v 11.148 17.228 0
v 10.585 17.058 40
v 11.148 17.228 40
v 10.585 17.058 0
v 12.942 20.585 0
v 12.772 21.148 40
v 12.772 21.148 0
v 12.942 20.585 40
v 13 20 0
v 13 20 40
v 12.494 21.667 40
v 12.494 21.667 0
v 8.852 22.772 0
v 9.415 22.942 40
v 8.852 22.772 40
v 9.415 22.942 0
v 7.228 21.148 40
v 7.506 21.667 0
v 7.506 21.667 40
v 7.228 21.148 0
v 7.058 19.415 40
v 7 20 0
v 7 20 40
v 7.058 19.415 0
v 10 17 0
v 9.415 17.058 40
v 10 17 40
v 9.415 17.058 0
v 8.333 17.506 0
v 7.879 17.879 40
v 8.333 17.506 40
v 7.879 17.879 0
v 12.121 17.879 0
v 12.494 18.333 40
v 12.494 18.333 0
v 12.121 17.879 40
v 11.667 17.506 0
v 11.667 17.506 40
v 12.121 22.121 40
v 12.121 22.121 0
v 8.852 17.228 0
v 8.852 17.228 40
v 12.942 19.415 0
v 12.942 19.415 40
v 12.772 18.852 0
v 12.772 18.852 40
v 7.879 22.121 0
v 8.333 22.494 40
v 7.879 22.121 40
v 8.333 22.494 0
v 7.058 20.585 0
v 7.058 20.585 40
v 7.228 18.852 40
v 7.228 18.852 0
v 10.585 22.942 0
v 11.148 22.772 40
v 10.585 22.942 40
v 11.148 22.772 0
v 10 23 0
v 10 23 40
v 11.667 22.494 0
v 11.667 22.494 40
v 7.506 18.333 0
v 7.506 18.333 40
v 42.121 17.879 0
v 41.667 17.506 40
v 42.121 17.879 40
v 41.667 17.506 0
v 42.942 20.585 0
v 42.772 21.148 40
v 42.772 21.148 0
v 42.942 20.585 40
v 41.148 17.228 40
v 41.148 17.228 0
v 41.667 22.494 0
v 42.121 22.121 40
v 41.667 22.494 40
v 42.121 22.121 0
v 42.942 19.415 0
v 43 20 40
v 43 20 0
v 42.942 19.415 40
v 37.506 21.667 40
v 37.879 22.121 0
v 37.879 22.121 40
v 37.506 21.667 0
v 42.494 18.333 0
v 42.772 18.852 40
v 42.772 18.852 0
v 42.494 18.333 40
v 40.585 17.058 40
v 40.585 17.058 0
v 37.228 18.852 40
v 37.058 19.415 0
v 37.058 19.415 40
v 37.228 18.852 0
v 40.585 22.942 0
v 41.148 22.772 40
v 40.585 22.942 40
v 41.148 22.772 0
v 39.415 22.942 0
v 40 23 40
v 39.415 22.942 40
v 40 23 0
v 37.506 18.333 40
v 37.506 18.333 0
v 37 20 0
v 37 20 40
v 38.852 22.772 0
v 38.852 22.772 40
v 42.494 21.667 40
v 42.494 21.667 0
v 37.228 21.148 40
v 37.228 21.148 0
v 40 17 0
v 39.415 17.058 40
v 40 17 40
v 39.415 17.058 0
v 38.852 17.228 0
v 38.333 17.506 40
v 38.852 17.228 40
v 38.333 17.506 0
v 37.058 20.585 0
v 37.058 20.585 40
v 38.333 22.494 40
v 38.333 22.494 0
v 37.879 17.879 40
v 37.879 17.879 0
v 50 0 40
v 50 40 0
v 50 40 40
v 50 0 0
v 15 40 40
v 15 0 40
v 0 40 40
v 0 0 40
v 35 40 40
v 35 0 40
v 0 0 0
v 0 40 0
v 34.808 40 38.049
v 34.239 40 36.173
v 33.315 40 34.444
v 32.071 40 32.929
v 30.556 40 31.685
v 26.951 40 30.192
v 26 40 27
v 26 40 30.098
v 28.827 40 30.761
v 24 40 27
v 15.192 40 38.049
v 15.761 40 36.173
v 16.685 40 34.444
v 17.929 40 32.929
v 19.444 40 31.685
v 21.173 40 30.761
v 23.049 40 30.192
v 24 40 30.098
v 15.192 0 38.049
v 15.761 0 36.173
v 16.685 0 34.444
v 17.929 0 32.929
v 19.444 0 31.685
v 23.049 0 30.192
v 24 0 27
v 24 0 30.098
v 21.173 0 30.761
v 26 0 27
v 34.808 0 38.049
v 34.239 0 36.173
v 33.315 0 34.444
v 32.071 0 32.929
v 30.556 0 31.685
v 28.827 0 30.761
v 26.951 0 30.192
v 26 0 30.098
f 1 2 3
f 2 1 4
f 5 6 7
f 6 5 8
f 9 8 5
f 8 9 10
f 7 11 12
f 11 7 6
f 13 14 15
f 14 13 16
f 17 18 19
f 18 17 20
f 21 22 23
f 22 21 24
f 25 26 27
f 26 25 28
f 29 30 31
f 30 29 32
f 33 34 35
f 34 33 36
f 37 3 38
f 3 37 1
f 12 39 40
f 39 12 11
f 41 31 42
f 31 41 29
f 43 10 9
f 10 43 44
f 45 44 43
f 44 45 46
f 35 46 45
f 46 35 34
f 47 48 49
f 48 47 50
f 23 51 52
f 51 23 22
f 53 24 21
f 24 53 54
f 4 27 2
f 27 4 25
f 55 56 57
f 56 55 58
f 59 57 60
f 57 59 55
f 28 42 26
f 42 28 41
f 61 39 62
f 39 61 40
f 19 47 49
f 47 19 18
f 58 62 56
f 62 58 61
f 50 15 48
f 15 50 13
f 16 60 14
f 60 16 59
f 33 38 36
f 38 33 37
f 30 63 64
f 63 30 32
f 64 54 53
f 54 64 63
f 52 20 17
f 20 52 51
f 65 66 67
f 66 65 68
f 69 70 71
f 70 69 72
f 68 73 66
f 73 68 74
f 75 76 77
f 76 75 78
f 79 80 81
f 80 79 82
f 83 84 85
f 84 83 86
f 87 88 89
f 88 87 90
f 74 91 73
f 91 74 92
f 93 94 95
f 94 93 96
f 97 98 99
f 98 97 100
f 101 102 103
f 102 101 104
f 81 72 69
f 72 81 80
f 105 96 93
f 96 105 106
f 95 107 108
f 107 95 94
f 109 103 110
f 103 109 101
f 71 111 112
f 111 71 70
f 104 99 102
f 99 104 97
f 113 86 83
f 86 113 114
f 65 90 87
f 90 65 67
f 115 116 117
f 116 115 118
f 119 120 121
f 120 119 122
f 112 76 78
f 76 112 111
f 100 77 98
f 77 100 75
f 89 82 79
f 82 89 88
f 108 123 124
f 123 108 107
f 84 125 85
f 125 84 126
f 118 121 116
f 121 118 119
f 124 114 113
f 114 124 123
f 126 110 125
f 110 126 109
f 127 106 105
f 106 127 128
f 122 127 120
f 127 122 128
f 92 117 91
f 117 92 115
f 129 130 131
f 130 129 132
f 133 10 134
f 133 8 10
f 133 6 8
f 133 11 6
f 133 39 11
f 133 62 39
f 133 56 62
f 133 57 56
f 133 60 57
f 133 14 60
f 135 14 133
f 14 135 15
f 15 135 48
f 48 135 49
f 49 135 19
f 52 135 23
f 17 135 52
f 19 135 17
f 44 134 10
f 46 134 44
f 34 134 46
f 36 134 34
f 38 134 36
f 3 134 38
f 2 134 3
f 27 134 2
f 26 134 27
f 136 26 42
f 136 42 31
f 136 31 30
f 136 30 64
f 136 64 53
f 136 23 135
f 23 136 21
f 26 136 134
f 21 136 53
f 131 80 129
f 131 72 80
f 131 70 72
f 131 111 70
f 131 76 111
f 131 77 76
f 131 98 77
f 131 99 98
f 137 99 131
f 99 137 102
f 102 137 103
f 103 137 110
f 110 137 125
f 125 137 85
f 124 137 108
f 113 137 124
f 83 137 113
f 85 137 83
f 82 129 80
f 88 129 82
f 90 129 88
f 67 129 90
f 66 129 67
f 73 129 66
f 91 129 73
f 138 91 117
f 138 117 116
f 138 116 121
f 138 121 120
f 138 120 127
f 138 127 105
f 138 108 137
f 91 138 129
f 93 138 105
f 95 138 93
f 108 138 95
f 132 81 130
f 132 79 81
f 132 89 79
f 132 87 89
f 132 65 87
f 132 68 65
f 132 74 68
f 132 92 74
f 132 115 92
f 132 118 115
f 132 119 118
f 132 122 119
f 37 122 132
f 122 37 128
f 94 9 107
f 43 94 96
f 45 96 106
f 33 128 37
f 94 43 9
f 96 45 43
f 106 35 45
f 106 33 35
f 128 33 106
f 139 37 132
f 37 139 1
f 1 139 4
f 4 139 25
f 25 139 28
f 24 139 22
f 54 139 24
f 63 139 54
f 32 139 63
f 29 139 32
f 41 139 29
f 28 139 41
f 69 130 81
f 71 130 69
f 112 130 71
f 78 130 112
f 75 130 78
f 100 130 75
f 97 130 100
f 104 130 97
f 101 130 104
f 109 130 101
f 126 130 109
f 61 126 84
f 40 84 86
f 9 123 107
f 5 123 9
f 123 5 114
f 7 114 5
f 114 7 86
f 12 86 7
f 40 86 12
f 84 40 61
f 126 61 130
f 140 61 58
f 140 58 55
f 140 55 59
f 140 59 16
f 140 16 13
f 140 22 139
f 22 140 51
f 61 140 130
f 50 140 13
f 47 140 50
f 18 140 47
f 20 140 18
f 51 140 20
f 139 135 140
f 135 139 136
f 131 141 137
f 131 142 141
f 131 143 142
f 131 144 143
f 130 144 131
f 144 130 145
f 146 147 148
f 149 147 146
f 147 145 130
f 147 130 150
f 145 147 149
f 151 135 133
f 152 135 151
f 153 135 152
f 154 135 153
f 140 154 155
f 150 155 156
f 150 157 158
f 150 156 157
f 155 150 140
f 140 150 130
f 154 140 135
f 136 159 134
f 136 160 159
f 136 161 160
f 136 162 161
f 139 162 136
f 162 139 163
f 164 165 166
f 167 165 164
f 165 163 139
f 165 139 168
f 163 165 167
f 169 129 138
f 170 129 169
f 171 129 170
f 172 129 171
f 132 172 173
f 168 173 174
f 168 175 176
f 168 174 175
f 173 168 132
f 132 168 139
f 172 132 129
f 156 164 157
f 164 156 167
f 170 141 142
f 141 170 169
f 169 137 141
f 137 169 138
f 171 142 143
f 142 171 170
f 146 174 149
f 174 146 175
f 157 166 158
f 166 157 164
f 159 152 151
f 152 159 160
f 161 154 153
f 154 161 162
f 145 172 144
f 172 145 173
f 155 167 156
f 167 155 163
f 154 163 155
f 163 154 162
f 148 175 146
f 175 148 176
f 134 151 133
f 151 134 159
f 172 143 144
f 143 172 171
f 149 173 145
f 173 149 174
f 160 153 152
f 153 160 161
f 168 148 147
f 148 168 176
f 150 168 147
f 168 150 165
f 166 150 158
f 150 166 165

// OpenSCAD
$fn = 32;

// ----------------------------------------------------------------------
// Saddle clamp: split shaft clamp
// ----------------------------------------------------------------------

// --- parameters (mm) ---
blk_l = 50;               // block length, X
blk_w = 40;               // block width, Y
blk_h = 40;               // block height
clamp_r = 10;             // shaft groove radius
hole_r = 3;               // bolt hole radius
hole_m = 10;              // bolt hole margin from the ends
saw_w = 2;                // saw kerf width

saw_depth = clamp_r + 3;  // saw kerf depth

difference() {
  cube([blk_l, blk_w, blk_h]);
  translate([blk_l / 2, -1, blk_h])
    rotate([-90, 0, 0])
      cylinder(h = blk_w + 2, r = clamp_r);
  for (sx = [0, 1])
    translate([sx ? blk_l - hole_m : hole_m, blk_w / 2, -1])
      cylinder(r = hole_r, h = blk_h + 2);
  translate([blk_l / 2 - saw_w / 2, -1, blk_h - saw_depth])
    cube([saw_w, blk_w + 2, saw_depth + 1]);
}
